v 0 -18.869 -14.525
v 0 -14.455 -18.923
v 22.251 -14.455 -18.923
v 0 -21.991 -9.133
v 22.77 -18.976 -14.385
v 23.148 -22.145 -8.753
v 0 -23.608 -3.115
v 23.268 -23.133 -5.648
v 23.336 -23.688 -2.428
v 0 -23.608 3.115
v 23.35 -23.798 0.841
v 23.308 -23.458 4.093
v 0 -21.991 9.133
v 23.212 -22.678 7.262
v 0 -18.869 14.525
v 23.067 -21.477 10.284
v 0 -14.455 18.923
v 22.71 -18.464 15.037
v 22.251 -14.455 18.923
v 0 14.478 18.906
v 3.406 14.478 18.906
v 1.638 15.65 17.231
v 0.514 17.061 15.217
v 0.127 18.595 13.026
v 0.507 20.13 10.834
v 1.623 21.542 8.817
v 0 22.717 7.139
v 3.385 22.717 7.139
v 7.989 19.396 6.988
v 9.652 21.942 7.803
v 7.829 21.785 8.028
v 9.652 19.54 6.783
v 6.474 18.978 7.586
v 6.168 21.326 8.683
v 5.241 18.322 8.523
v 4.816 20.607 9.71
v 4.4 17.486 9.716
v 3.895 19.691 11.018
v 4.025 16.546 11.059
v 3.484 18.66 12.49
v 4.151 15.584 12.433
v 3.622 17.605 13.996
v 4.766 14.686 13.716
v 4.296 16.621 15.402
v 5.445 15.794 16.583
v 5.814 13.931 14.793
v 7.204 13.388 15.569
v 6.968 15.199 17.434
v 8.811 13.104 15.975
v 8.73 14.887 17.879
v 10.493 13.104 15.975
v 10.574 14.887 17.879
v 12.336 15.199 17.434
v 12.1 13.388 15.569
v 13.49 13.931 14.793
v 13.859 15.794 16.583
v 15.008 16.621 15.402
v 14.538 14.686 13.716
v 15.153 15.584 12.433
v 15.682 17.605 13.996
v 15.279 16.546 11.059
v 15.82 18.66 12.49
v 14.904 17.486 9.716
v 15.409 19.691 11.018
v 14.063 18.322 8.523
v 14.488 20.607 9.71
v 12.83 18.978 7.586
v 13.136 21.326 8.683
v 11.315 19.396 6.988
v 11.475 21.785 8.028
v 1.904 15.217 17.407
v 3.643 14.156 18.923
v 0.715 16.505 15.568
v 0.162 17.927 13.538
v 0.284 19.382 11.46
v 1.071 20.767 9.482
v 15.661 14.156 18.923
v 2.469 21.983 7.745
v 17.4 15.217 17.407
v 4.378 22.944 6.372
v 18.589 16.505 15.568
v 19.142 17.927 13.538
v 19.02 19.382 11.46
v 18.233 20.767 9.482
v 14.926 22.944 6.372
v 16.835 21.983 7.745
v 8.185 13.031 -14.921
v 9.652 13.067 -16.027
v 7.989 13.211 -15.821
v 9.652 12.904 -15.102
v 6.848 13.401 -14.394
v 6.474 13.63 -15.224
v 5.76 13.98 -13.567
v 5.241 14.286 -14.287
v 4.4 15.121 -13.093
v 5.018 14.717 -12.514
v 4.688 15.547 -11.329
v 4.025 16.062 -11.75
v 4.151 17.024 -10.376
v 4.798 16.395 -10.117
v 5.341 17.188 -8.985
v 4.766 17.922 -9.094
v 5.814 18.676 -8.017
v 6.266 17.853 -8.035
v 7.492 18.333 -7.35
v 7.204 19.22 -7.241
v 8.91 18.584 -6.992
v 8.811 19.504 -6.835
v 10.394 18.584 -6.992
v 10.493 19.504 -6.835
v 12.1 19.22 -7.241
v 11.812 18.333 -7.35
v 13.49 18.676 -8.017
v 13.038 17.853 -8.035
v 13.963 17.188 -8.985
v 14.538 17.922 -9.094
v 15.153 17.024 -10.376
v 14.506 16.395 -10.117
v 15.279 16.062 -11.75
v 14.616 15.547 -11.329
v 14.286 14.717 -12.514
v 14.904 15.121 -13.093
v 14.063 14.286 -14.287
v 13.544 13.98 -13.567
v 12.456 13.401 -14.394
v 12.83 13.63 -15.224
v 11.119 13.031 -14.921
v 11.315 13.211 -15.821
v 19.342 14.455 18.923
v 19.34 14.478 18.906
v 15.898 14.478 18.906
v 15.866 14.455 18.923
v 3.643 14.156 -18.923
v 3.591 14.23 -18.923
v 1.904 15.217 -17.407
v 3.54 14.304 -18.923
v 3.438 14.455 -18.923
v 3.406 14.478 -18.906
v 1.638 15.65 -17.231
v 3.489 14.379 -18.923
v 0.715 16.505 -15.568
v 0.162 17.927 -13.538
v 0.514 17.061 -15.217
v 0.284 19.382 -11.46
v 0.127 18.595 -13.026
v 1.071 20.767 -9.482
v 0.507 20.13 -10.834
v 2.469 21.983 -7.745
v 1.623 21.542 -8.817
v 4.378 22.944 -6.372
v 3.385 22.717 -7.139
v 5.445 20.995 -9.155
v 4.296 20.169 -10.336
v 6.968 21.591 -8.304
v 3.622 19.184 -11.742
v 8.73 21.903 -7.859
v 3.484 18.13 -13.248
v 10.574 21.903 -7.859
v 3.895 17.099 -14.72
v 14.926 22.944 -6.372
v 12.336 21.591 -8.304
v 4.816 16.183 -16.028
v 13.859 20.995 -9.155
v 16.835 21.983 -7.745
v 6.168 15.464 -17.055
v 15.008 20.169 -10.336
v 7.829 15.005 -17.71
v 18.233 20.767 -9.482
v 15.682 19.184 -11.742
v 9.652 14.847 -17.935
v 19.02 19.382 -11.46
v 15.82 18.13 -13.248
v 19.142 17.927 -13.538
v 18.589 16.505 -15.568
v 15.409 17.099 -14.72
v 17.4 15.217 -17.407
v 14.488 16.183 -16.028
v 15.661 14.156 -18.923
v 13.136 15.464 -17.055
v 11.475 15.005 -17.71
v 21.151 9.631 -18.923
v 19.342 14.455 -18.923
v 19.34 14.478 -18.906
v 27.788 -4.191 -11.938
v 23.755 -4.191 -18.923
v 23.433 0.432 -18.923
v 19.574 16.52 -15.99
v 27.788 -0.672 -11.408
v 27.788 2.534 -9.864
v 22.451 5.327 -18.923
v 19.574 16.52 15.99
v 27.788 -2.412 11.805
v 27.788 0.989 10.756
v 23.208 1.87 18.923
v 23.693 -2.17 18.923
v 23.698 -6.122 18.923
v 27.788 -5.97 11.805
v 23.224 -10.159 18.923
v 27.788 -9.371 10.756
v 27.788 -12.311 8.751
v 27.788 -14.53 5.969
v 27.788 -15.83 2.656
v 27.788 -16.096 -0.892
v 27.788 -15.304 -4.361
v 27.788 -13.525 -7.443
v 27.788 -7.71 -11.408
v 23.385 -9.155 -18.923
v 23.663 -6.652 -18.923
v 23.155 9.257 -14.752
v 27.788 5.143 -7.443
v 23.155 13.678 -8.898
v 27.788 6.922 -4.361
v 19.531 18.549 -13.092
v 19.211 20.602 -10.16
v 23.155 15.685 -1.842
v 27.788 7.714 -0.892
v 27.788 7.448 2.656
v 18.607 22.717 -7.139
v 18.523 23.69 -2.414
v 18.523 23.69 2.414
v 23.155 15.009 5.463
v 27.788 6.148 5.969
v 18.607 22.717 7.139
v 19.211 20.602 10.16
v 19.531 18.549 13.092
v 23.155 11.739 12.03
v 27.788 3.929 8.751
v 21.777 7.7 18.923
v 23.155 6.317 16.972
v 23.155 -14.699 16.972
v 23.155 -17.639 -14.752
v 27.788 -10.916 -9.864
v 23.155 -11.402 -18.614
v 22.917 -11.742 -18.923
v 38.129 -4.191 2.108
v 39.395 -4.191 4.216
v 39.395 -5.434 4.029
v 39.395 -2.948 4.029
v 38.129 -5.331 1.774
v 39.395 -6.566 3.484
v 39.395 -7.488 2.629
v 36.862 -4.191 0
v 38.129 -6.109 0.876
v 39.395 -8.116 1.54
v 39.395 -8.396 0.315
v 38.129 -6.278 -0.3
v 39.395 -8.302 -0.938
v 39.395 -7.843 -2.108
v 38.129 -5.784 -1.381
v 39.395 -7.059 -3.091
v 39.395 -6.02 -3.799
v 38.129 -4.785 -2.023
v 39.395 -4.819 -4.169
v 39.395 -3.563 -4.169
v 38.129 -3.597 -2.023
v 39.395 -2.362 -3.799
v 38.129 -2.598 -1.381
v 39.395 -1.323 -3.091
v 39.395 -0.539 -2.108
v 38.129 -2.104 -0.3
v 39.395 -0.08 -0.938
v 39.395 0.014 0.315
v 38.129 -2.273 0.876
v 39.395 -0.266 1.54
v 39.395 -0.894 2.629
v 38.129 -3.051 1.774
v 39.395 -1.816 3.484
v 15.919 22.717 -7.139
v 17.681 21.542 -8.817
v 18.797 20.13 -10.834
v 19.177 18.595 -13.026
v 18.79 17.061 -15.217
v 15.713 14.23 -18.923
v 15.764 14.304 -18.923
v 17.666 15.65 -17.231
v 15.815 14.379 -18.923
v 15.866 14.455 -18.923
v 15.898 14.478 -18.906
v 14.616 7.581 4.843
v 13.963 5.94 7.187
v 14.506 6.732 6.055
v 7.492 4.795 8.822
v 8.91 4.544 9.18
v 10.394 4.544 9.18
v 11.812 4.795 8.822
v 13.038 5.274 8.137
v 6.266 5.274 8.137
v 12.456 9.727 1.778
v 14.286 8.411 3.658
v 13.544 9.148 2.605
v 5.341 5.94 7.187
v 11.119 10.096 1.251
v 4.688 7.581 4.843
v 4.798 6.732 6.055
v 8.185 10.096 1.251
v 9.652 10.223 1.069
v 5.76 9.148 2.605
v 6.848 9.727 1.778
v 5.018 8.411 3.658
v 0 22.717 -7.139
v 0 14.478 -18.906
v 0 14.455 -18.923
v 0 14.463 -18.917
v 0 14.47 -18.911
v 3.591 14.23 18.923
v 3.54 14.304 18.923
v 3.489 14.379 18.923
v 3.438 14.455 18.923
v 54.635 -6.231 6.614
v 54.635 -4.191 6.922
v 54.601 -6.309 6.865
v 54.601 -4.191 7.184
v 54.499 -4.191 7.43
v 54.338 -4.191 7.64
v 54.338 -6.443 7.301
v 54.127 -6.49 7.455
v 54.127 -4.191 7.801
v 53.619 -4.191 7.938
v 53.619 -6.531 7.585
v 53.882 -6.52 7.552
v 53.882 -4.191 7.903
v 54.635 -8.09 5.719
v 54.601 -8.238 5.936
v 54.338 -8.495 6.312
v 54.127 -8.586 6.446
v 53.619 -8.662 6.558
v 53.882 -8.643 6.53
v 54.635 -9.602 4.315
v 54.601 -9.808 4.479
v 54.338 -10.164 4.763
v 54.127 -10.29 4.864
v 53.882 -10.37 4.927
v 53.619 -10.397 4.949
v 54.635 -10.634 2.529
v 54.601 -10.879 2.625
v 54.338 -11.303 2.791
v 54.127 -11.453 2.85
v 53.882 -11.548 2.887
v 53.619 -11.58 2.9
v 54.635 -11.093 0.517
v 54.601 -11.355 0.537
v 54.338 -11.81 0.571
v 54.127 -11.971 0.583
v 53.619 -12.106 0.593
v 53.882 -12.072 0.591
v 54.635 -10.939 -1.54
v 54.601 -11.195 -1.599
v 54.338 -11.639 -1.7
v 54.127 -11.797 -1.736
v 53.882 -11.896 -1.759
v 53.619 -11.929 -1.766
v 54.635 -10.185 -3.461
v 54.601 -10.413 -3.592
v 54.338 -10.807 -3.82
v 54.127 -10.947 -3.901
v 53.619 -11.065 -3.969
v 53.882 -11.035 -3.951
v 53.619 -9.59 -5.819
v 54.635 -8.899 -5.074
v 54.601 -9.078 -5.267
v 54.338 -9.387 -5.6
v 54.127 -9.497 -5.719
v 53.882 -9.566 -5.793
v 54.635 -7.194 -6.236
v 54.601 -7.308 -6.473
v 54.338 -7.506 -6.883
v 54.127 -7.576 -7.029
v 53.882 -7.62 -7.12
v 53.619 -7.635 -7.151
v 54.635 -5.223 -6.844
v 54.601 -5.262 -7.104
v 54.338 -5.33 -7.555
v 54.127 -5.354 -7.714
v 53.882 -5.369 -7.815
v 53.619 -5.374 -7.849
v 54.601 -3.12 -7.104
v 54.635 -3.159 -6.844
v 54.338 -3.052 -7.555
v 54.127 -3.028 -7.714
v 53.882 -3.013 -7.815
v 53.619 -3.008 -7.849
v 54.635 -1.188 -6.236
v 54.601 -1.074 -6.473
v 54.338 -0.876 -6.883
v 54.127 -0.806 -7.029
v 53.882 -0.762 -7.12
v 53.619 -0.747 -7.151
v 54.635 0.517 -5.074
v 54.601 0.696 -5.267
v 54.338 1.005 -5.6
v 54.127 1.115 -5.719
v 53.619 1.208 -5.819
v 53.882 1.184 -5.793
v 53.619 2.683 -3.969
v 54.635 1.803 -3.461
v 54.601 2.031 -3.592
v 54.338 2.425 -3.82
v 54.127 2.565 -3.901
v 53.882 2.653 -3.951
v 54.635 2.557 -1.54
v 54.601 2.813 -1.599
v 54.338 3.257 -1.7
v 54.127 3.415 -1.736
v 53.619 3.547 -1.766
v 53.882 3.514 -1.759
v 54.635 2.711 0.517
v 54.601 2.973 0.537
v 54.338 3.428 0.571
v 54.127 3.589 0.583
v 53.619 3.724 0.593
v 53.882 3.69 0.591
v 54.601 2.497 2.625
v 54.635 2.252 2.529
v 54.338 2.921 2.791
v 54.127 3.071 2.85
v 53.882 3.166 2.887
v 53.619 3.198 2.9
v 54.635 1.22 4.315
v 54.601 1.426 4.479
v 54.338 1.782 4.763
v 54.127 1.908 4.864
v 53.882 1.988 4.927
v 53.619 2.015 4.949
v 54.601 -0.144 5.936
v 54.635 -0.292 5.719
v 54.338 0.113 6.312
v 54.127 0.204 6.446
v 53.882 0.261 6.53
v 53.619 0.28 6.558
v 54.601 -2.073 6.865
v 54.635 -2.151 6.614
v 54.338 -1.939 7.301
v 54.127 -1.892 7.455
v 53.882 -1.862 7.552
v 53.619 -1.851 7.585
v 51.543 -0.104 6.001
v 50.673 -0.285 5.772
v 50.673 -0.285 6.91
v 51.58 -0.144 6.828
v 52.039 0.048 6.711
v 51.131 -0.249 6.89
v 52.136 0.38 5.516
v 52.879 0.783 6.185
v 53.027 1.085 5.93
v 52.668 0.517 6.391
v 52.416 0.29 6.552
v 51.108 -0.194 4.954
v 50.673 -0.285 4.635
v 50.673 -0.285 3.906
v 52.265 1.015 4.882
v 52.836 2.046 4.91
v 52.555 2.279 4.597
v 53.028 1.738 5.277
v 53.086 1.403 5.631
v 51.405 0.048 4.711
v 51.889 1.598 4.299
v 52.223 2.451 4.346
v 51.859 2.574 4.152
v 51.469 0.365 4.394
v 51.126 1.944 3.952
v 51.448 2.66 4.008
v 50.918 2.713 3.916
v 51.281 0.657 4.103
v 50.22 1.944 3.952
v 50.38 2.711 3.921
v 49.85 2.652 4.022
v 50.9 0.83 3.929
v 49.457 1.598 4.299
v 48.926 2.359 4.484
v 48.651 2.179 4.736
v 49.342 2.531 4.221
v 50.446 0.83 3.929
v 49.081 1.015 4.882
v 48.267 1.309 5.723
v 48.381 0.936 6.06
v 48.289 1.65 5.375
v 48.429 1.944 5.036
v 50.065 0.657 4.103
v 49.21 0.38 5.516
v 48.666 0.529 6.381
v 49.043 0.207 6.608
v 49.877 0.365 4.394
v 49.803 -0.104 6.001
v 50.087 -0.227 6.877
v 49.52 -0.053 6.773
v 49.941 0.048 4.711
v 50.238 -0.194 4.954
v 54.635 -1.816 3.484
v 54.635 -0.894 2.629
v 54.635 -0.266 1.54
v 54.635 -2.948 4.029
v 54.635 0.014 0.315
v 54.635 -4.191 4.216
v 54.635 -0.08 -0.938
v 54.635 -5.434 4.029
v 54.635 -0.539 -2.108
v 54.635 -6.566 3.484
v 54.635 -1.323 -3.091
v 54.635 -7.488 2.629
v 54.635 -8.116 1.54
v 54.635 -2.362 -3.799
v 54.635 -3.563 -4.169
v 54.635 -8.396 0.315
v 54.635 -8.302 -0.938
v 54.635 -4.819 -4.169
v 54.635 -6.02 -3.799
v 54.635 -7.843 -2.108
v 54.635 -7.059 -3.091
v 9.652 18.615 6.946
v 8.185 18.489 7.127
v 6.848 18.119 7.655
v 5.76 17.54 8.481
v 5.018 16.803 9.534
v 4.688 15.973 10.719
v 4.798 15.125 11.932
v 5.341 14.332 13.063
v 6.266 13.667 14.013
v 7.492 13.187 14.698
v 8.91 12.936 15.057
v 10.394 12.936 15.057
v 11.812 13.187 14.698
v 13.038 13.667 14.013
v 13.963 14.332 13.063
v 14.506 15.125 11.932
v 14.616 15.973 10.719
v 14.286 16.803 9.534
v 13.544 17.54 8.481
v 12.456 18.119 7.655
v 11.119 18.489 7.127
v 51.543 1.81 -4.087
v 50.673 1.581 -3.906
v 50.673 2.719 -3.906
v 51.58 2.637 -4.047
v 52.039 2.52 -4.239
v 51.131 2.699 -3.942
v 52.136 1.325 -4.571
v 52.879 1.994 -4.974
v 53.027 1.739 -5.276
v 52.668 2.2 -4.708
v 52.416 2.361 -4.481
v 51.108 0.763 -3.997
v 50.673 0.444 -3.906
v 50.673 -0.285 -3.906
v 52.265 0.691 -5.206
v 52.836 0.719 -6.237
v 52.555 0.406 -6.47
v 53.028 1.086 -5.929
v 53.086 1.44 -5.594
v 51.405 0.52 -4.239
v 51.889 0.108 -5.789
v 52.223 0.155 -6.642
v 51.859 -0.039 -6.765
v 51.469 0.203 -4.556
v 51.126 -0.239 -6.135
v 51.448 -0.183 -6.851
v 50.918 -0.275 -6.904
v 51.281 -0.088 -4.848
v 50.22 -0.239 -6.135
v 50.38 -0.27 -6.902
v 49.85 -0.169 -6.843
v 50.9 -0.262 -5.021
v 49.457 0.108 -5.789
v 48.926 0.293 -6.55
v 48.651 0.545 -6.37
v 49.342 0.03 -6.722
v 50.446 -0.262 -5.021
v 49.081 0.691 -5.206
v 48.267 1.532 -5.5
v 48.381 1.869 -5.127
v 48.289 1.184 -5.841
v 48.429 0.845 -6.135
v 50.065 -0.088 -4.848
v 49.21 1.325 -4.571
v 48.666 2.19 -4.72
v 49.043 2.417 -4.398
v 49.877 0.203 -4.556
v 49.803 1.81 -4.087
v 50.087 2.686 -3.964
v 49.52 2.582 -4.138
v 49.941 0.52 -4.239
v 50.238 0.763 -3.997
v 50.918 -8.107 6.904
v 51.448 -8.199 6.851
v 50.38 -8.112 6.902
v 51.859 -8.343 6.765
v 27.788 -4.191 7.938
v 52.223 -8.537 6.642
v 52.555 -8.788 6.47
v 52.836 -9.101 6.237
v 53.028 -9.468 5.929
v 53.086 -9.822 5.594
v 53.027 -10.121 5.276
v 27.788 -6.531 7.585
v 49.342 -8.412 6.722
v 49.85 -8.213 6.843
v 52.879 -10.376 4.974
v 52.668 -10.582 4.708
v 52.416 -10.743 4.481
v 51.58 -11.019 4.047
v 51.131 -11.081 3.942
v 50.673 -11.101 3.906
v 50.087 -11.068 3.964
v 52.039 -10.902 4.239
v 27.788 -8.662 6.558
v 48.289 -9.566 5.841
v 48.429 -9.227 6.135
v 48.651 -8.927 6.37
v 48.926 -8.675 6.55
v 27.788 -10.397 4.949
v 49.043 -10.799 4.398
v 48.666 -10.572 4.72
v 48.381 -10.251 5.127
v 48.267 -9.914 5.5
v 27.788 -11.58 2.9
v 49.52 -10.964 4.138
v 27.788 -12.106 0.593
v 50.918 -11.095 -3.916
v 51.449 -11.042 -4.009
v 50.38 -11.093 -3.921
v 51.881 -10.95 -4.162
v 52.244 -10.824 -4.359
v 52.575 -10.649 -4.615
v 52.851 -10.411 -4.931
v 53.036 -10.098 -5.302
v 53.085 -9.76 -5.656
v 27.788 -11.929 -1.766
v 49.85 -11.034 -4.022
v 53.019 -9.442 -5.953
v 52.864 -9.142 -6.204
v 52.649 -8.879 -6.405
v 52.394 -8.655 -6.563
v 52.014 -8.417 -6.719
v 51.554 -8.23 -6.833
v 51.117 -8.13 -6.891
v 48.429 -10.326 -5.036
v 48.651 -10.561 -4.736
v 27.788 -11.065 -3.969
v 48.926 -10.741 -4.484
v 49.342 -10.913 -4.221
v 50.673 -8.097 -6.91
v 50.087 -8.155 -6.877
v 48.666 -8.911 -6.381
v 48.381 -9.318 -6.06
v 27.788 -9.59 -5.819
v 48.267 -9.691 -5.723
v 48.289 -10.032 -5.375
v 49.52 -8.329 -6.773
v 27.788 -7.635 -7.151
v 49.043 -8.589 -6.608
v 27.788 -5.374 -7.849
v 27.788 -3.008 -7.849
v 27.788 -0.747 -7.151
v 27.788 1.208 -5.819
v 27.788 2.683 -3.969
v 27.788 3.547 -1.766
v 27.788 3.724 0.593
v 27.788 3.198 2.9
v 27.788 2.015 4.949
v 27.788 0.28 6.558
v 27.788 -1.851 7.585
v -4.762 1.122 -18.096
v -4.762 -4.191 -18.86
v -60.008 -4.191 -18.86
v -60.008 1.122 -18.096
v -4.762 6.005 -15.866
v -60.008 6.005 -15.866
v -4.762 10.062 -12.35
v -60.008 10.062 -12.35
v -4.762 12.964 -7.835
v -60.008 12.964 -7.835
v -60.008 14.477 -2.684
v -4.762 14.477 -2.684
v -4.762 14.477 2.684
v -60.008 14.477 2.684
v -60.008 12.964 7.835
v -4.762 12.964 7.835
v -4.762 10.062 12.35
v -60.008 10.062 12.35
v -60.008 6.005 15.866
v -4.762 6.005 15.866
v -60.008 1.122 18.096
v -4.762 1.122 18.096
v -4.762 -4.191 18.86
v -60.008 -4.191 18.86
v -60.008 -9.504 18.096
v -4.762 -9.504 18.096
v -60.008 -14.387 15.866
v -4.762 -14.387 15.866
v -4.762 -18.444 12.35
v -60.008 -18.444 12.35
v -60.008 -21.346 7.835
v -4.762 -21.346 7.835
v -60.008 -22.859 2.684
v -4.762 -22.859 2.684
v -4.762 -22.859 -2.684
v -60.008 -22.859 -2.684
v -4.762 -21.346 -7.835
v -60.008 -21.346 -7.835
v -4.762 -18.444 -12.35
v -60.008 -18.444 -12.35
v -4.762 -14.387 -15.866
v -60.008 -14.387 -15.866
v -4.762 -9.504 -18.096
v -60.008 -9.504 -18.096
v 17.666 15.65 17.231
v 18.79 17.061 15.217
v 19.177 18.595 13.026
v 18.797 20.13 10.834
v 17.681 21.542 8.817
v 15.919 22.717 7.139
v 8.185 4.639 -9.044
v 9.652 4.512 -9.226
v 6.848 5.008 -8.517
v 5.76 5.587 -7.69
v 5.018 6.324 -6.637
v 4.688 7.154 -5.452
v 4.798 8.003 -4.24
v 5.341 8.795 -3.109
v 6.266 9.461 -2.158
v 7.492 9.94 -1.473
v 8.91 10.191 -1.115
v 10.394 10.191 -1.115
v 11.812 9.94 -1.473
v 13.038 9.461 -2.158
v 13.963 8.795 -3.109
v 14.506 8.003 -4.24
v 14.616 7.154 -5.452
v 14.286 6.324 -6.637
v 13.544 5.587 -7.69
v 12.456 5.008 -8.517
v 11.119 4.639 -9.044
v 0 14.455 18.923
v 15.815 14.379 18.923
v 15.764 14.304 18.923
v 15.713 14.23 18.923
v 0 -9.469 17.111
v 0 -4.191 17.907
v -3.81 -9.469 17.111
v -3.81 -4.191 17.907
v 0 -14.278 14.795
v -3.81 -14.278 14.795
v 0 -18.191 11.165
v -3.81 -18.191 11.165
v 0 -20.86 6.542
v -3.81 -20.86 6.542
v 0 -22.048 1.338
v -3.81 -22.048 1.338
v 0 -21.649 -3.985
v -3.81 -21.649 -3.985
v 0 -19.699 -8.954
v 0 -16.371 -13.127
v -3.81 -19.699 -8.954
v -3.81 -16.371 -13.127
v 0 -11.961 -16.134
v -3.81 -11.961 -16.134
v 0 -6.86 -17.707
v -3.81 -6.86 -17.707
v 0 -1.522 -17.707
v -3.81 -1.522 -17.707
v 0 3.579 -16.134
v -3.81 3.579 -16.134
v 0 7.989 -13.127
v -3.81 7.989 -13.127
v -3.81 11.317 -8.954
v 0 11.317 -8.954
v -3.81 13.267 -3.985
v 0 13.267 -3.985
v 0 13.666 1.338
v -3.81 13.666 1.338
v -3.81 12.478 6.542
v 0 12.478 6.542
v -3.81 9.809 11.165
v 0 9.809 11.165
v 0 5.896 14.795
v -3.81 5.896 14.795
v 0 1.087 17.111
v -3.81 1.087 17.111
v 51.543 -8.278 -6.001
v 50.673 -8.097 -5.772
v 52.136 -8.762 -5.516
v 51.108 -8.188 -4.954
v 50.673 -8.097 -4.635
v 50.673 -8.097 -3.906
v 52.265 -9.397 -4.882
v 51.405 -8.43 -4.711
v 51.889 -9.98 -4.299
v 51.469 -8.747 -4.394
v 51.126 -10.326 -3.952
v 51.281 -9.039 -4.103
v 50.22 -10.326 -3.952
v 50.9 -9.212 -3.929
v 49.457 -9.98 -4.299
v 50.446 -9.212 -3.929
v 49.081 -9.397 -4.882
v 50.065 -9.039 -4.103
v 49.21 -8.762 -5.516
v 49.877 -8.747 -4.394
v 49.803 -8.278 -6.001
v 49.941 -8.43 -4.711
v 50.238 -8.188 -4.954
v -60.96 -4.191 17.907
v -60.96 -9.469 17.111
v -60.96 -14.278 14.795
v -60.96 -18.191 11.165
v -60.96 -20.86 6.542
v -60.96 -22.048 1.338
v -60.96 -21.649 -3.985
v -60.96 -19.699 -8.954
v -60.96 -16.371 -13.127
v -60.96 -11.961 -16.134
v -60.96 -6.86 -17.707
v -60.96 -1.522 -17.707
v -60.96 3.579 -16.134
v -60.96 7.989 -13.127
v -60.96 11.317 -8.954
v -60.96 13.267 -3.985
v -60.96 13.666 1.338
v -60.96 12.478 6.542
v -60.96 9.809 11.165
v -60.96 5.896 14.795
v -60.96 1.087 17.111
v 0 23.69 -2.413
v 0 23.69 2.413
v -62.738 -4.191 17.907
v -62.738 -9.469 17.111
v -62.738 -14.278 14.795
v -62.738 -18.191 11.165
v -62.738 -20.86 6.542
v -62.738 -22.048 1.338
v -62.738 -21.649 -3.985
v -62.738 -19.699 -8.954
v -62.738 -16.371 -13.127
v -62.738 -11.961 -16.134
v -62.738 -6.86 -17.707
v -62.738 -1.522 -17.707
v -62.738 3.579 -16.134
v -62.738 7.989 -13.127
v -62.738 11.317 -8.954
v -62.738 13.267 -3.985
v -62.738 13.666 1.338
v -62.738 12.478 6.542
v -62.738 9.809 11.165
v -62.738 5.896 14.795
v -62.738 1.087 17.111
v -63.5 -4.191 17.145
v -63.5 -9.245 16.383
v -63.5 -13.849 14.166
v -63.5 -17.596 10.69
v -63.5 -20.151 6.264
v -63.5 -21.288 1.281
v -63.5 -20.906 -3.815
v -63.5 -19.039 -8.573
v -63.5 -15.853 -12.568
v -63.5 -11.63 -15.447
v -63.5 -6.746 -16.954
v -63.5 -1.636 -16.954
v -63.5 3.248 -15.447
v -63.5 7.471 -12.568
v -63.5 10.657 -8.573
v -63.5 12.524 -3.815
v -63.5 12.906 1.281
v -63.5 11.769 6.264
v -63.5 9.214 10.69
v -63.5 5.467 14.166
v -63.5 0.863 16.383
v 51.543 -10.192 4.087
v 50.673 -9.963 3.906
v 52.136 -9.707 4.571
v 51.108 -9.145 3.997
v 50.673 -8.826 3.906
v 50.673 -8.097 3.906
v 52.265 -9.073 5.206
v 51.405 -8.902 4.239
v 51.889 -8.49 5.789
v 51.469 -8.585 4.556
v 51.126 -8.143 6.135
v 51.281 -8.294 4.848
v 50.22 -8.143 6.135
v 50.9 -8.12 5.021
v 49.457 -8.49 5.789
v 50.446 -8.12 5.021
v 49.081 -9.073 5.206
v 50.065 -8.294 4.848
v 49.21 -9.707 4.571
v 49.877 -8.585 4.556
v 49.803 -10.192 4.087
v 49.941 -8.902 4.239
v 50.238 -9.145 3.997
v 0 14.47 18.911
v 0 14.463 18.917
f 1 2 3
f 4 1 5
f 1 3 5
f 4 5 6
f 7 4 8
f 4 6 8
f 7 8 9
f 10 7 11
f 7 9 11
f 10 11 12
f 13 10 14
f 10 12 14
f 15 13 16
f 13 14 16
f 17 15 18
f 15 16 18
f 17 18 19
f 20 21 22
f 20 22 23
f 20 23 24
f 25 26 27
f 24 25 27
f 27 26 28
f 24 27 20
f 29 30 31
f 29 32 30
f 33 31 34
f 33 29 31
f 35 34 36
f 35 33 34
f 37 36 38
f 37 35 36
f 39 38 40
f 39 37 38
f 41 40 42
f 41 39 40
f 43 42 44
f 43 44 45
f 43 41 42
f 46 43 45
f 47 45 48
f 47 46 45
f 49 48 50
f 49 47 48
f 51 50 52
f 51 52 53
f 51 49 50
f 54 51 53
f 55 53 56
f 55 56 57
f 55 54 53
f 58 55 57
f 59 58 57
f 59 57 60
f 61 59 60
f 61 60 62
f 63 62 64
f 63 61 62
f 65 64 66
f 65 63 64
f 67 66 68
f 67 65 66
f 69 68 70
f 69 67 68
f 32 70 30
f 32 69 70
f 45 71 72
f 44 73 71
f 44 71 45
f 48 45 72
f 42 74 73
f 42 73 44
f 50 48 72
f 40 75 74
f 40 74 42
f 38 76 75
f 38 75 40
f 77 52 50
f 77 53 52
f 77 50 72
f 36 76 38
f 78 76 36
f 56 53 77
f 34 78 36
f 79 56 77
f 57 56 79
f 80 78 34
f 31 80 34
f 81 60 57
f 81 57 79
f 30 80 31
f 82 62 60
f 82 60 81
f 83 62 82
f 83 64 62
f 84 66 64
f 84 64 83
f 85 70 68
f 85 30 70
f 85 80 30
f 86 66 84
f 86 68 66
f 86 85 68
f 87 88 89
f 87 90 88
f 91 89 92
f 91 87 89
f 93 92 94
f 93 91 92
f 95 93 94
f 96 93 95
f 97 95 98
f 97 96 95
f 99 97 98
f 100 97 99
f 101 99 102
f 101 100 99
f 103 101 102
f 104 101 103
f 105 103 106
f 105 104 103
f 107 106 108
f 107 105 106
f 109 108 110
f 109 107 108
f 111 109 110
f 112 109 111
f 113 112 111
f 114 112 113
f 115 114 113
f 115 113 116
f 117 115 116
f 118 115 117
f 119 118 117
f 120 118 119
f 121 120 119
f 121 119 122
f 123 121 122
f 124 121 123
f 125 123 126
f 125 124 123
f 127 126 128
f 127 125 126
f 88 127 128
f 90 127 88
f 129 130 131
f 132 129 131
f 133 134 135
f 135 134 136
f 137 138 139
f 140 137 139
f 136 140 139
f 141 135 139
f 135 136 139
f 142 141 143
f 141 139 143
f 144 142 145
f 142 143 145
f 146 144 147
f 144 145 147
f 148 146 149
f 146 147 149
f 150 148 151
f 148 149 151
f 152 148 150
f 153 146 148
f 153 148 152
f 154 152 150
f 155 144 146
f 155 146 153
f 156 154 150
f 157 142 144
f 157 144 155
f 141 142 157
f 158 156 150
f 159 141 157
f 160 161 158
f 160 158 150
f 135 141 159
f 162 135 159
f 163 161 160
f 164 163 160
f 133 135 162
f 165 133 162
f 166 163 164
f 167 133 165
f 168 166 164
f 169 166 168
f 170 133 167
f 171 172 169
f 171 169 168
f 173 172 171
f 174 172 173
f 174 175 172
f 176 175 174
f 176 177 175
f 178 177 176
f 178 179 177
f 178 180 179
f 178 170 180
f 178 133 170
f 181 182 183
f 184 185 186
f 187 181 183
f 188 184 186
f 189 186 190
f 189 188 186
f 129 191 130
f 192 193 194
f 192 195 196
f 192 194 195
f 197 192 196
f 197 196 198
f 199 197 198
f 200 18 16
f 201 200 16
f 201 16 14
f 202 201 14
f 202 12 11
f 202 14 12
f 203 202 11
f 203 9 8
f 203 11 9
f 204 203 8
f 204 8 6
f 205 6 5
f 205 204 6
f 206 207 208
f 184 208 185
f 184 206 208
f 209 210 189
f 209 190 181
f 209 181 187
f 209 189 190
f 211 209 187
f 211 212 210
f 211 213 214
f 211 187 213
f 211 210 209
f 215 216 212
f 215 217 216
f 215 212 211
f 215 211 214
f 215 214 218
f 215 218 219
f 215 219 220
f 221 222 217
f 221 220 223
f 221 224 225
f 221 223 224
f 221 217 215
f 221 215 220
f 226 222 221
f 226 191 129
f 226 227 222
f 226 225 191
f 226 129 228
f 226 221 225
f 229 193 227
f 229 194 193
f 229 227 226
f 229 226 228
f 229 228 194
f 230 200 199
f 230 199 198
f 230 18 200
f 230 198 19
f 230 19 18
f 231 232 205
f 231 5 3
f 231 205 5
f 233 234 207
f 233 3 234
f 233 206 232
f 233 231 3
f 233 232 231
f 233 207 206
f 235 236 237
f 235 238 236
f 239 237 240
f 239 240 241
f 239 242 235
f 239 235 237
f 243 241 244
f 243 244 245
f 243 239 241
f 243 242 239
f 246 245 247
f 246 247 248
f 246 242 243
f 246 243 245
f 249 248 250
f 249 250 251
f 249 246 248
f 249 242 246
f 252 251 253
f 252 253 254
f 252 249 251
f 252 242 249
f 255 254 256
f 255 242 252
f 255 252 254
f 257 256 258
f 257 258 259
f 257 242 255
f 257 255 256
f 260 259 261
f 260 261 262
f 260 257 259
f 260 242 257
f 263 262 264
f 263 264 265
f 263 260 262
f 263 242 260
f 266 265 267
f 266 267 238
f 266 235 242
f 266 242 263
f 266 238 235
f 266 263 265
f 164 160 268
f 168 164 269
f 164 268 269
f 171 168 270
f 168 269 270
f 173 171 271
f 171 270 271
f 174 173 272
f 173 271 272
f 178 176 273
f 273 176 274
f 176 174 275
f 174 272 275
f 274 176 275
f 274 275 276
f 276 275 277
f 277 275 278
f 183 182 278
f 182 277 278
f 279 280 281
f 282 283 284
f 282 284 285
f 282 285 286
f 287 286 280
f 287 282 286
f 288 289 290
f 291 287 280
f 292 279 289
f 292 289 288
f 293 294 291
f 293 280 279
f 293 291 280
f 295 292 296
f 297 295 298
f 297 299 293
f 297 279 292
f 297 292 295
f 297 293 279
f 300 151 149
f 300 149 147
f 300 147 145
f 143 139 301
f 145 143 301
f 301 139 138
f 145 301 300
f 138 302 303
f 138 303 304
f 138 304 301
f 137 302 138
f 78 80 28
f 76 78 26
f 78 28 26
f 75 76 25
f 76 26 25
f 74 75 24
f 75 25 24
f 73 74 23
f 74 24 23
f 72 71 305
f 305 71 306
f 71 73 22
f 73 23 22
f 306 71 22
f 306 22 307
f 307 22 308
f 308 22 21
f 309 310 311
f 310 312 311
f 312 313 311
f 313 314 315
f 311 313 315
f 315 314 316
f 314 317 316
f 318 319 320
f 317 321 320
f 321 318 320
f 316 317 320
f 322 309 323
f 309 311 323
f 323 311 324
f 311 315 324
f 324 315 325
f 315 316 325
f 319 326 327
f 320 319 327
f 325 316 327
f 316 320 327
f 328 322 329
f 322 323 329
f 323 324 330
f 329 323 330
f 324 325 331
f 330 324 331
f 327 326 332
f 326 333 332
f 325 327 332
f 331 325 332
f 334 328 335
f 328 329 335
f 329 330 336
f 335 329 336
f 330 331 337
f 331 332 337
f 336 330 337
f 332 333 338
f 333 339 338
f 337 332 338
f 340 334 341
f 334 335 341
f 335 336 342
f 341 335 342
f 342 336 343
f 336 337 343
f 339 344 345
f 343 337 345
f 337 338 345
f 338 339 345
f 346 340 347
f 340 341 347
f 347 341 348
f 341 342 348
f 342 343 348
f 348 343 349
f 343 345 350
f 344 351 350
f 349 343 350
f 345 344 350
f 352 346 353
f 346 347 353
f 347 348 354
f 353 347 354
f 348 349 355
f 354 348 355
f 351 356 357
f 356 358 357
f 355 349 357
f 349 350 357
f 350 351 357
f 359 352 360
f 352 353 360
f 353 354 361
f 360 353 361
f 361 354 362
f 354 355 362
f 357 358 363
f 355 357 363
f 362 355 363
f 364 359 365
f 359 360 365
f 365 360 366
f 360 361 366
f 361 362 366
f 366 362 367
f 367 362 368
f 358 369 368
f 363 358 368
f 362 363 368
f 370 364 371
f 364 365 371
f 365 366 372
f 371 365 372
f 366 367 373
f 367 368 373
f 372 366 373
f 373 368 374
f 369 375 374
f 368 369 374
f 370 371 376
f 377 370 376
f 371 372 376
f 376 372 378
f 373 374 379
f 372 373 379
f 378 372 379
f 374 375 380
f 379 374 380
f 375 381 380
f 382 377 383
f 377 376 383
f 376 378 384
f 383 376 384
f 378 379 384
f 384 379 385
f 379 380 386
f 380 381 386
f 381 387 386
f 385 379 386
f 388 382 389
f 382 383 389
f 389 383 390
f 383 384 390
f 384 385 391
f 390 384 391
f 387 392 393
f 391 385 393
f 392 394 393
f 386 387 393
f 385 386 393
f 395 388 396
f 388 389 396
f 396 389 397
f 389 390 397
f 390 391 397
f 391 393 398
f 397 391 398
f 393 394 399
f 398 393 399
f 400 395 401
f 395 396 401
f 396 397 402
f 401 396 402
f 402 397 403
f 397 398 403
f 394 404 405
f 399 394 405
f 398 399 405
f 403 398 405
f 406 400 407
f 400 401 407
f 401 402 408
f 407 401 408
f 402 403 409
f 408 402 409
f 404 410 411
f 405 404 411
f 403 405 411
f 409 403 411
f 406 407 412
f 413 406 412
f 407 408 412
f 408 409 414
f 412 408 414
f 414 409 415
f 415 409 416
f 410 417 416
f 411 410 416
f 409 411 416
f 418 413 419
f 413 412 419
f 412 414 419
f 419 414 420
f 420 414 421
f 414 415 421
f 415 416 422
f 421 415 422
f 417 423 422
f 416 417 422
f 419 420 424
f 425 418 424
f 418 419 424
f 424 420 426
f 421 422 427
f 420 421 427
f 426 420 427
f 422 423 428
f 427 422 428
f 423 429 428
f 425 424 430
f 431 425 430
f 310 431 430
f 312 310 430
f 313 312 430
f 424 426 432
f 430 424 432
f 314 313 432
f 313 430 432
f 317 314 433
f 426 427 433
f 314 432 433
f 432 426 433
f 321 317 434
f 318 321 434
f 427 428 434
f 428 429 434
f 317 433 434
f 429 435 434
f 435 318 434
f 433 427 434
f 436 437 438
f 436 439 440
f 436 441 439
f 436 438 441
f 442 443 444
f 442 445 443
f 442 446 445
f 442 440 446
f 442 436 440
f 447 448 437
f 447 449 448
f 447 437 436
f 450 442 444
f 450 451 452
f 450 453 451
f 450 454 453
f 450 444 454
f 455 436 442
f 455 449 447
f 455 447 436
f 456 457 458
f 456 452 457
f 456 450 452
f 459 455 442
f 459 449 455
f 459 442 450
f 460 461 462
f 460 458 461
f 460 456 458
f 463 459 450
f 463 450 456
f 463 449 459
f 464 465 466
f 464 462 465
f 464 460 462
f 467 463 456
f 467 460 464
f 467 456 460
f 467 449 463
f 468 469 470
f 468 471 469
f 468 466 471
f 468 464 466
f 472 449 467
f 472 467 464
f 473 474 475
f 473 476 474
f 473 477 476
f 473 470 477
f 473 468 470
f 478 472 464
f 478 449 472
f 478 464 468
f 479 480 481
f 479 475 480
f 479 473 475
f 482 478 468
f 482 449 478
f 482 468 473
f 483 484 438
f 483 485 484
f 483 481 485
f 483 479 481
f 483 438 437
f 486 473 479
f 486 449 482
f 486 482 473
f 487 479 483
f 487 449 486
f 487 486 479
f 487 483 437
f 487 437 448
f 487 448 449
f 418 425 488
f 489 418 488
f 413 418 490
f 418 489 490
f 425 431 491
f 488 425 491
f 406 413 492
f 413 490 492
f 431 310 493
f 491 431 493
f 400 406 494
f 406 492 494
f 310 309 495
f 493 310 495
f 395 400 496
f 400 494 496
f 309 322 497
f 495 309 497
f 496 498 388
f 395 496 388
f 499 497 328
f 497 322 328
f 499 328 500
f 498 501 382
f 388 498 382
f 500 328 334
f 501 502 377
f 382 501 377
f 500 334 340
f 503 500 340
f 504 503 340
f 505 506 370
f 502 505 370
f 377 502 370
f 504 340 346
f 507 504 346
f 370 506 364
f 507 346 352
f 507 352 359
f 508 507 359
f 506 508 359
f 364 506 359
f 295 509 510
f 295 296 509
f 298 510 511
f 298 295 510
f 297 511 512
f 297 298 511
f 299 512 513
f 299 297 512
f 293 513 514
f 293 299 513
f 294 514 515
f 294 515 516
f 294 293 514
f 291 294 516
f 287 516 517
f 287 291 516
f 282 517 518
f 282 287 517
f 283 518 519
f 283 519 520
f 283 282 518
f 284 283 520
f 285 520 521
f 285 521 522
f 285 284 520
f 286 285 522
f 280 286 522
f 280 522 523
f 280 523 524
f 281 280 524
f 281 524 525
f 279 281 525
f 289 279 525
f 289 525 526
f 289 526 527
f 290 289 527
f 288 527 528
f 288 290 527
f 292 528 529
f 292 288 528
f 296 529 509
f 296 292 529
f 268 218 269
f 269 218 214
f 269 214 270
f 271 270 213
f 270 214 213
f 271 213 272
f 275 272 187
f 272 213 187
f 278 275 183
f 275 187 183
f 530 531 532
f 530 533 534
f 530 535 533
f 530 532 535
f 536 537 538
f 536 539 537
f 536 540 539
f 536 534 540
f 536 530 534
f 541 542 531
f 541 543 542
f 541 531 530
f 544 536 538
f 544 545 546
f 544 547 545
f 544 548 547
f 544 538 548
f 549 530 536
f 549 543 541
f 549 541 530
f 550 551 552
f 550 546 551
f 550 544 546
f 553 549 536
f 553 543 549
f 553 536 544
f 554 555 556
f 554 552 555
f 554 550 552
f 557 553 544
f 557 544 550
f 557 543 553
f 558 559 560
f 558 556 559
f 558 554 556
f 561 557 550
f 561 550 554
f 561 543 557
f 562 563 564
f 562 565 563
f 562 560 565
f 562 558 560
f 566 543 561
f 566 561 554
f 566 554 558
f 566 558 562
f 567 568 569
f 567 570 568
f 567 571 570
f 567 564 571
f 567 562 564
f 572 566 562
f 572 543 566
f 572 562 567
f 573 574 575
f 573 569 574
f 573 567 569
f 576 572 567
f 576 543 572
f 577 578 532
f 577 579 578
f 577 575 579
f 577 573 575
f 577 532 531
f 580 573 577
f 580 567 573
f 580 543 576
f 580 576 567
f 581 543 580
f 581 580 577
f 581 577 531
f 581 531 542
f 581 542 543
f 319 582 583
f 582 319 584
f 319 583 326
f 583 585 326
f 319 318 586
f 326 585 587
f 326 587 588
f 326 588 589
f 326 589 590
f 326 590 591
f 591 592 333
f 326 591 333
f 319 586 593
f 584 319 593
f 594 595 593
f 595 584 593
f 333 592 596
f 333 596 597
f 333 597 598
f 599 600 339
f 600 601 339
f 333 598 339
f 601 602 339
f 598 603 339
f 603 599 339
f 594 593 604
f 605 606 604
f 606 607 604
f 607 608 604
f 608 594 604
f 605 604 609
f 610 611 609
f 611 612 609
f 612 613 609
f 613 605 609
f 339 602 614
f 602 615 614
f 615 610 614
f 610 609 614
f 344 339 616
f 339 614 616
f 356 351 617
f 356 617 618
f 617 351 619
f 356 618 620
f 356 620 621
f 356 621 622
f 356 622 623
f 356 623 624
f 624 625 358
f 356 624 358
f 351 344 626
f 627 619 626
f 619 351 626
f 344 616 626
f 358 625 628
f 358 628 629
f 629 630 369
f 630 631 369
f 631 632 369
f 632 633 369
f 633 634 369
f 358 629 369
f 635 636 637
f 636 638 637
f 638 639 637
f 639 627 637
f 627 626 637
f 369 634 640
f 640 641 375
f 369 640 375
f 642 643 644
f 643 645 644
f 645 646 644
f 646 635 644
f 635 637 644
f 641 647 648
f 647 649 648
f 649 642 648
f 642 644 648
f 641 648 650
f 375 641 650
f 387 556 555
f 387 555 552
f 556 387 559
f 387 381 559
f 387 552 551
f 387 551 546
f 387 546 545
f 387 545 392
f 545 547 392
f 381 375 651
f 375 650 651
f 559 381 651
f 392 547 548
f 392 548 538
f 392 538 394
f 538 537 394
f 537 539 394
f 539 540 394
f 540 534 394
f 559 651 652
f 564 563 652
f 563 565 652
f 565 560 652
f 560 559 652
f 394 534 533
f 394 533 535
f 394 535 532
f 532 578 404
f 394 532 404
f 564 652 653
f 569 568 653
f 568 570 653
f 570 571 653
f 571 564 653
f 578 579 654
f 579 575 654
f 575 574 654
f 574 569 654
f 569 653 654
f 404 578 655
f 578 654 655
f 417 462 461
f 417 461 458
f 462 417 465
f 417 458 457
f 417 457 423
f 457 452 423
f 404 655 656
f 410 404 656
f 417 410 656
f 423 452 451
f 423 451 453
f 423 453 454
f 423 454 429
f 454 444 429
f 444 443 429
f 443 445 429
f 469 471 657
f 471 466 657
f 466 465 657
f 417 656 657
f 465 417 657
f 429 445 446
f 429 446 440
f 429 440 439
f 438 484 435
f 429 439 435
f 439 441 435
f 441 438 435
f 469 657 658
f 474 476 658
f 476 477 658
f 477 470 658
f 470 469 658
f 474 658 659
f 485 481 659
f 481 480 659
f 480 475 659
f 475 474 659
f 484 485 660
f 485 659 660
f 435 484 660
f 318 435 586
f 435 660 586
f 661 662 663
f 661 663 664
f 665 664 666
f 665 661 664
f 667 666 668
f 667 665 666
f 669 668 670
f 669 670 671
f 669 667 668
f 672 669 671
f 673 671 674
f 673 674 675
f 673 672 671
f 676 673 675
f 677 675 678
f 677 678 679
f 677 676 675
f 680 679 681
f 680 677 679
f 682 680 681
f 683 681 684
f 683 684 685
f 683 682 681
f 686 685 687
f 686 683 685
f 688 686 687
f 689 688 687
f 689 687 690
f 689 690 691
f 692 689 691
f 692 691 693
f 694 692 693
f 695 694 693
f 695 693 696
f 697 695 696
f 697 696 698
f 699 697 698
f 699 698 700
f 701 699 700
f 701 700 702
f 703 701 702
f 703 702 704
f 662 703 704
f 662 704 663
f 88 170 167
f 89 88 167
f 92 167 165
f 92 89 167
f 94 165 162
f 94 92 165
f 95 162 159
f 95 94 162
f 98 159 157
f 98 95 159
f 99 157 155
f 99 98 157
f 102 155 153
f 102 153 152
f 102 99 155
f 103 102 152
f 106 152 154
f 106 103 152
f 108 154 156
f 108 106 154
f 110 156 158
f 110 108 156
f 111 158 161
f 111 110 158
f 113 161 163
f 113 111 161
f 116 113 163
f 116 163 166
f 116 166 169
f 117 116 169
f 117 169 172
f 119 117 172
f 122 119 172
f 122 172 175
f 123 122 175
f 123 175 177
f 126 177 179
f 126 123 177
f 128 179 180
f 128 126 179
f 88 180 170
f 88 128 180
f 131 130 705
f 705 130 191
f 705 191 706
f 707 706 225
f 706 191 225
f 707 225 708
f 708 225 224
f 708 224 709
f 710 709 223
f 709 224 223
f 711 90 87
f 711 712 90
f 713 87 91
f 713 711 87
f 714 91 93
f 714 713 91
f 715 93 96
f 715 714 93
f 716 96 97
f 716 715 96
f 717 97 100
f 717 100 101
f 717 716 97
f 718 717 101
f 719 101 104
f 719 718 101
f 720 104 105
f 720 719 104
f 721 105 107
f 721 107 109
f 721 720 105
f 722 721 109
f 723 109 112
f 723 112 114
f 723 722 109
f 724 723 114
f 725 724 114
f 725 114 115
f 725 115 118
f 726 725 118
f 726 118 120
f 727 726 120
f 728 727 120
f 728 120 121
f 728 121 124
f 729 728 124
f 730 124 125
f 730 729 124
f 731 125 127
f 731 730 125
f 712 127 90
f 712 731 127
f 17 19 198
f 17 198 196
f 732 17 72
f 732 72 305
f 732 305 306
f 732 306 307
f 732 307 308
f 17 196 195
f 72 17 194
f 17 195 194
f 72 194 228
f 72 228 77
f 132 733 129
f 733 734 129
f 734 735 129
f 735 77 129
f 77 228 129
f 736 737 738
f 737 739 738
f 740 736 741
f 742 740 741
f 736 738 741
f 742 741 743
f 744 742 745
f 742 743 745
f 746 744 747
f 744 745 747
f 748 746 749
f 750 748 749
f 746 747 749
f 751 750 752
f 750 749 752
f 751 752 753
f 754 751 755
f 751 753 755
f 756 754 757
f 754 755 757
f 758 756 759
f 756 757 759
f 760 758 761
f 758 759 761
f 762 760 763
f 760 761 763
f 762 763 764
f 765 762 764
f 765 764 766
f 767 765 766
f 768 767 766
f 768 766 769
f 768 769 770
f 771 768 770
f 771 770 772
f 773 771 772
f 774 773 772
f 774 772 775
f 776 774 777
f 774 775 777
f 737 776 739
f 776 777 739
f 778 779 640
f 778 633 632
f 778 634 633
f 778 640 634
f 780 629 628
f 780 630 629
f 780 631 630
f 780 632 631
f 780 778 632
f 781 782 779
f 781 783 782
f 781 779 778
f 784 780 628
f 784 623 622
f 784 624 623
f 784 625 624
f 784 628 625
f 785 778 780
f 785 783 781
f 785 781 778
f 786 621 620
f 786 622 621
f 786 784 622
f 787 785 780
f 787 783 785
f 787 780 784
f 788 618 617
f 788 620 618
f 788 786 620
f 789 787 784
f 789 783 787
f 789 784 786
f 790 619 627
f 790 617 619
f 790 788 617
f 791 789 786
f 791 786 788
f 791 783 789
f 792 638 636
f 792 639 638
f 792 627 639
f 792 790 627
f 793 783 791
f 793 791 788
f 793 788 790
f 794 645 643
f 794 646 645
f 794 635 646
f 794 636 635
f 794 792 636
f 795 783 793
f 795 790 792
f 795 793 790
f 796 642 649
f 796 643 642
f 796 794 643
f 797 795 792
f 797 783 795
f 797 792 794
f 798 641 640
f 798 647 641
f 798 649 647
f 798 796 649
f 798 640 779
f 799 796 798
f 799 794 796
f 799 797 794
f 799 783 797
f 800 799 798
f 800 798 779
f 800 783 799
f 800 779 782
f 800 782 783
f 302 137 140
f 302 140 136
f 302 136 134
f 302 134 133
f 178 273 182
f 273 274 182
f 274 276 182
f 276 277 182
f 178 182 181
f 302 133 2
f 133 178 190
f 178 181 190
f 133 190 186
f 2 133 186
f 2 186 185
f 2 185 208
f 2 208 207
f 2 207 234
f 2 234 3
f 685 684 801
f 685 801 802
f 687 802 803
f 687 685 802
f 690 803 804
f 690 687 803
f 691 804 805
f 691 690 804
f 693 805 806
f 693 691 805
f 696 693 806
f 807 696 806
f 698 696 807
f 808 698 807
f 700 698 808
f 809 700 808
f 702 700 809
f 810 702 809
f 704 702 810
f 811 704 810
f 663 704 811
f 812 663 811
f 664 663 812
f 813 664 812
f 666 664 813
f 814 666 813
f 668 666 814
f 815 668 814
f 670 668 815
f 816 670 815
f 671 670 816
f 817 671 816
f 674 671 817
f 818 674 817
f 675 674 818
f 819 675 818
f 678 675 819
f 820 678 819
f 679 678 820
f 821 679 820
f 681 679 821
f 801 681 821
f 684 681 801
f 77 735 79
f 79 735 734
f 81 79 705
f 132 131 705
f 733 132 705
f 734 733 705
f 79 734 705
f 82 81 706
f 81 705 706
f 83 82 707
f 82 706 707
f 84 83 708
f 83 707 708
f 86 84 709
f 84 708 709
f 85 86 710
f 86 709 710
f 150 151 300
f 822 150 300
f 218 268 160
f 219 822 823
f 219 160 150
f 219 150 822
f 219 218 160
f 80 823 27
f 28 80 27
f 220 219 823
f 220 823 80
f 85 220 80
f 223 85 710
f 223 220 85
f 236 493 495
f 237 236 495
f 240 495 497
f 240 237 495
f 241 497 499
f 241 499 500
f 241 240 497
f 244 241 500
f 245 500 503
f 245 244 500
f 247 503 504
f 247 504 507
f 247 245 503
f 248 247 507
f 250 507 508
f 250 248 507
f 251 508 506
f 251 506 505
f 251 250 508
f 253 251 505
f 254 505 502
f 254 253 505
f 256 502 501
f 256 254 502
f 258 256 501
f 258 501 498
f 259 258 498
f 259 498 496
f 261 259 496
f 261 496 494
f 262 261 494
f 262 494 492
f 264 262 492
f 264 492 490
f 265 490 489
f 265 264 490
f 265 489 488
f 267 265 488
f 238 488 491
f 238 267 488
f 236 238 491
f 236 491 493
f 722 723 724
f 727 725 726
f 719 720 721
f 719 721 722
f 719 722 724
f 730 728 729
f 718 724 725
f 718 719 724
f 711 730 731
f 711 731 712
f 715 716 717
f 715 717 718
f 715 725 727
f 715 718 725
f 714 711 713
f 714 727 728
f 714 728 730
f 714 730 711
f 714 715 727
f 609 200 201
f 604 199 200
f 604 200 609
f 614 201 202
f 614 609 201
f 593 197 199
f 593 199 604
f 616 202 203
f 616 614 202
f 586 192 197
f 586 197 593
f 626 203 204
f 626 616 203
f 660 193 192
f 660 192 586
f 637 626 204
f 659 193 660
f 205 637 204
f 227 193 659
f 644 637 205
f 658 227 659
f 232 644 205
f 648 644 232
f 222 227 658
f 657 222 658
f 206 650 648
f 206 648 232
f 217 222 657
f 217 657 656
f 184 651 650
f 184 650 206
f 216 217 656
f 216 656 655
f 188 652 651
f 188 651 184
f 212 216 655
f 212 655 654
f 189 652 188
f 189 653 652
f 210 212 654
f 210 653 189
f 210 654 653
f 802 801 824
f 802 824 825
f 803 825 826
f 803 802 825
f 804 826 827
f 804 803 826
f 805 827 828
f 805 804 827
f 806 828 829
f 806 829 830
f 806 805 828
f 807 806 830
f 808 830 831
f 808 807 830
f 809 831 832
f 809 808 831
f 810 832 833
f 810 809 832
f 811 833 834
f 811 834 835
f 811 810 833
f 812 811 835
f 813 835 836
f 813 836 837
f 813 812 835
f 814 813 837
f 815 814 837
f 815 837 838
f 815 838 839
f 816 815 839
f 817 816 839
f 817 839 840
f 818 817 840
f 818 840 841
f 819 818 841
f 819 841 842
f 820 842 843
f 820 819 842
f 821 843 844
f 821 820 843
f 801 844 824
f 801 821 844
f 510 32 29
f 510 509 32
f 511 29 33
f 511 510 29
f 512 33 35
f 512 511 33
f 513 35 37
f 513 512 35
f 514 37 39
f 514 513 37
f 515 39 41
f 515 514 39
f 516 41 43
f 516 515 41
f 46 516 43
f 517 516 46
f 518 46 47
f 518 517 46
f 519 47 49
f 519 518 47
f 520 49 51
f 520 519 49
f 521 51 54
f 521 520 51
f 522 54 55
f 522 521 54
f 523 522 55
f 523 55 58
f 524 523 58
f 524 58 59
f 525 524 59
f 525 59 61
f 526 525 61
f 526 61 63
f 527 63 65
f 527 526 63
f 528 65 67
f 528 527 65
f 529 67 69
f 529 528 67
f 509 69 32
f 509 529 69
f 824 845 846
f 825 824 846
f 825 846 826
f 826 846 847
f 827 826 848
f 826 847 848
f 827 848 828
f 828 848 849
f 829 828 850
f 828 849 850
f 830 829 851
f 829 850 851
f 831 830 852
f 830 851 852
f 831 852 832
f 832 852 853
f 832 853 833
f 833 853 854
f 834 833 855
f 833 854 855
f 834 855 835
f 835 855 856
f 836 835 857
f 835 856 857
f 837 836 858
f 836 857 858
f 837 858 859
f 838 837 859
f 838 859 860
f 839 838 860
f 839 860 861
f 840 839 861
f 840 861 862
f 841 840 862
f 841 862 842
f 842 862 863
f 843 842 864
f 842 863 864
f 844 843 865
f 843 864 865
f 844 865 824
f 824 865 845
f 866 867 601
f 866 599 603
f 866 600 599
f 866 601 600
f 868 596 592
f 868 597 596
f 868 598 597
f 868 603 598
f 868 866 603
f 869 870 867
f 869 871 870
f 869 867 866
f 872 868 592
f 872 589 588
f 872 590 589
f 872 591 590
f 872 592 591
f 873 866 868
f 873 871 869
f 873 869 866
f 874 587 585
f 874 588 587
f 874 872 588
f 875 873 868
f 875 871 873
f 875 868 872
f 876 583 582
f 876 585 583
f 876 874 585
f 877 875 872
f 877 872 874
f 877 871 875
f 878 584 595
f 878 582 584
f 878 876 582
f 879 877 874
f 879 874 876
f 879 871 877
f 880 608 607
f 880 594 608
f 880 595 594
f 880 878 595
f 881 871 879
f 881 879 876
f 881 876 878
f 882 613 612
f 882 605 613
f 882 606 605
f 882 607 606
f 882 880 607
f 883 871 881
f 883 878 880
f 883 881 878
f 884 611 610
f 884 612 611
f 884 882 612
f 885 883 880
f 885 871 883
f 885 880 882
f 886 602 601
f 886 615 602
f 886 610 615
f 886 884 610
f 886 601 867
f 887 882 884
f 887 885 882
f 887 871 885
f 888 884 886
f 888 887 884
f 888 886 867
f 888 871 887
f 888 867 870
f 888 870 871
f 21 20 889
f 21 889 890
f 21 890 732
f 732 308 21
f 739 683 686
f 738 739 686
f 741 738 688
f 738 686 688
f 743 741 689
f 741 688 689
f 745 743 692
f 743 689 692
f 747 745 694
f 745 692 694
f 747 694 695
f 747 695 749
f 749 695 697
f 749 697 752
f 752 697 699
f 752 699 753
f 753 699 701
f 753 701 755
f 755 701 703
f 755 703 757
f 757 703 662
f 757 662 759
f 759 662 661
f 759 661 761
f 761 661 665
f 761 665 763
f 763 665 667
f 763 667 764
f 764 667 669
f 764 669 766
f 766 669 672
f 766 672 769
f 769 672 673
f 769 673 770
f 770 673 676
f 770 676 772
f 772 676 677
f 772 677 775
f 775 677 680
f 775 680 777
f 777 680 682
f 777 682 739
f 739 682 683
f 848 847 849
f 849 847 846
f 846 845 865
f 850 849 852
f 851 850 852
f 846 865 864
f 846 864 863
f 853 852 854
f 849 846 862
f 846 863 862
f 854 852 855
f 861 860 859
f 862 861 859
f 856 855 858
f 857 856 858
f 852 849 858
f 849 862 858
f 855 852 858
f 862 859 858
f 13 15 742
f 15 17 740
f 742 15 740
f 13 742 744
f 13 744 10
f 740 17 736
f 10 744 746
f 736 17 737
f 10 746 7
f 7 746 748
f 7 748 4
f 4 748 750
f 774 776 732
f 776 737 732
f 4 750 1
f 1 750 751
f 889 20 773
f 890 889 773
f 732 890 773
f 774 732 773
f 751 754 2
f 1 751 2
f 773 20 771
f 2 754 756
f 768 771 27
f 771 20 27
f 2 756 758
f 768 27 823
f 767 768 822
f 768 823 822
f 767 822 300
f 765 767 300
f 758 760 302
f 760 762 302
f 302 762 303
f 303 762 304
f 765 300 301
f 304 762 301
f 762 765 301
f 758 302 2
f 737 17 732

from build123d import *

# Parameters (mm, degrees)
SKETCH1_R           = 23.8125
EXTRUDE1_DEPTH      = 27.7876
EXTRUDE1_DEPTH_BACK = 63.5
CUT_EXTRUDE1_REACH  = 65.5
SKETCH2_R           = 23.8125
SKETCH2_R_2         = 18.8595
CUT_EXTRUDE3_START  = -27.7876
SKETCH4_R           = 28.575
CUT_EXTRUDE3_DEPTH  = 27.7876
SKETCH18_R          = 9.525
CUT_EXTRUDE4_DEPTH  = 0.254
SKETCH19_R          = 9.525
CUT_EXTRUDE5_DEPTH  = 0.254
CHAMFER1_SIZE       = 0.762
CIRPATTERN1_COUNT   = 4


with BuildPart() as part:
    # Sketch1 → Extrude1 (new body, two sides)
    with BuildSketch(Plane(origin=(0, 0, 0), x_dir=(0, 0, -1), z_dir=(1, 0, 0))) as extrude1_sk:
        Circle(SKETCH1_R)
    extrude(amount=EXTRUDE1_DEPTH)
    extrude(extrude1_sk.sketch, amount=-EXTRUDE1_DEPTH_BACK)

    # Sketch2 → Cut-Extrude1 (cut, up to next)
    with BuildSketch(Plane(origin=(0, 0, 0), x_dir=(0, 0, -1), z_dir=(1, 0, 0)), mode=Mode.PRIVATE) as cut_extrude1_sk1:
        Circle(SKETCH2_R)
        with Locations((0, -4.191)):
            Circle(SKETCH2_R_2, mode=Mode.SUBTRACT)
    cut_extrude1_tool1 = extrude(cut_extrude1_sk1.sketch, amount=-CUT_EXTRUDE1_REACH, mode=Mode.PRIVATE) & part.part
    add(cut_extrude1_tool1.solids().sort_by_distance((0, 0, 23.138981))[0], mode=Mode.SUBTRACT)

    # Sketch4 → Cut-Extrude3 (cut)
    with BuildSketch(Plane.ZY.offset(CUT_EXTRUDE3_START)):
        Circle(SKETCH4_R)
        with BuildLine():
            Line((18.923, -14.455283714), (18.923, 14.465869871))
            Line((18.923, 14.465869871), (0, 27.715897117))
            Line((0, 27.715897117), (-18.923, 14.465869871))
            Line((-18.923, 14.465869871), (-18.923, -14.455283714))
            ThreePointArc((-18.923, -14.455283714), (0, -23.8125), (18.923, -14.455283714))
        make_face(mode=Mode.SUBTRACT)
    extrude(amount=CUT_EXTRUDE3_DEPTH, mode=Mode.SUBTRACT)

    # Sketch6 → Cut-Revolve2 (revolve, cut)
    with BuildSketch(Plane.XY, mode=Mode.PRIVATE) as cut_revolve2_sk:
        Polygon((4.764025965, 47.625), (27.7876, 7.747), (27.7876, 47.625), align=None)
    revolve(cut_revolve2_sk.sketch.rotate(Axis((3.612847264, -4.191, 0), (1, 0, 0)), 270), axis=Axis((3.612847264, -4.191, 0), (1, 0, 0)), mode=Mode.SUBTRACT)  # turned: the seam where the file's is

    # S2D0002 → Cut-Revolve3 (revolve, cut)
    with BuildSketch(Plane(origin=(9.652, 18.394824642, 12.869035589), x_dir=(0, 0.573576436, -0.819152044), z_dir=(1, 0, 0))):
        Polygon((0, 0), (6.1849, 0), (5.642306865, -2.5527), (4.9784, -3.216606865), (4.9784, -13.462), (0, -13.462), align=None)
    revolve(axis=Axis((9.652, 6.816028581, 4.761475303), (0, 0.819152044, 0.573576436)), mode=Mode.SUBTRACT)

    # Sketch8 → Cut-Revolve4 (revolve, cut)
    with BuildSketch(Plane(origin=(9.652, 18.394824642, -12.869035589), x_dir=(0, -0.573576436, -0.819152044), z_dir=(1, 0, 0))):
        Polygon((0, 0), (6.1849, 0), (5.642306865, -2.5527), (4.9784, -3.216606865), (4.9784, -13.462), (0, -13.462), align=None)
    revolve(axis=Axis((9.652, 6.816028581, -4.761475303), (0, 0.819152044, -0.573576436)), mode=Mode.SUBTRACT)

    # Sketch18 → Cut-Extrude4 (cut)
    with BuildSketch(Plane(origin=(0, 18.59764611, 13.022211999), x_dir=(1, 0, 0), z_dir=(0, 0.819152044, 0.573576436))):
        with Locations((9.652, 0.009141155)):
            Circle(SKETCH18_R)
    extrude(amount=-CUT_EXTRUDE4_DEPTH, mode=Mode.SUBTRACT)

    # Sketch19 → Cut-Extrude5 (cut)
    with BuildSketch(Plane(origin=(0, 18.59764611, -13.022211999), x_dir=(1, 0, 0), z_dir=(0, 0.819152044, -0.573576436))):
        with Locations((9.652, -0.009141155)):
            Circle(SKETCH19_R)
    extrude(amount=-CUT_EXTRUDE5_DEPTH, mode=Mode.SUBTRACT)

    # Sketch10 → Cut-Revolve6 (revolve, cut)
    with BuildSketch(Plane.XY, mode=Mode.PRIVATE) as cut_revolve6_sk:
        Polygon((0, 14.6685), (0, 13.716), (-3.81, 13.716), (-4.7625, 14.6685), align=None)
    revolve(cut_revolve6_sk.sketch.rotate(Axis((-5.000625, -4.191, 0), (1, 0, 0)), 90), axis=Axis((-5.000625, -4.191, 0), (1, 0, 0)), mode=Mode.SUBTRACT)  # turned: the seam where the file's is

    # Sketch12 → Cut-Revolve8 (revolve, cut)
    with BuildSketch(Plane.XY, mode=Mode.PRIVATE) as cut_revolve8_sk:
        Polygon((-63.5, 14.6685), (-63.5, 13.716), (-60.96, 13.716), (-60.0075, 14.6685), align=None)
    revolve(cut_revolve8_sk.sketch.rotate(Axis((-63.674625, -4.191, 0), (1, 0, 0)), 90), axis=Axis((-63.674625, -4.191, 0), (1, 0, 0)), mode=Mode.SUBTRACT)  # turned: the seam where the file's is

    # Chamfer1
    chamfer1_edges = [part.edges().sort_by_distance(p)[0] for p in [
        (-63.5, -4.191, -17.907),
    ]]
    chamfer(chamfer1_edges, length=CHAMFER1_SIZE)

    # Sketch13 → Revolve1 (revolve)
    with BuildSketch(Plane(origin=(0, 0, 0), x_dir=(0, -1, 0), z_dir=(0, 0, 1)), mode=Mode.PRIVATE) as revolve1_sk:
        with BuildLine():
            Line((4.191, 27.7876), (4.191, 54.6354))
            Line((4.191, 54.6354), (11.1125, 54.6354))
            ThreePointArc((11.1125, 54.6354), (11.83092049, 54.33782049), (12.1285, 53.6194))
            Line((12.1285, 53.6194), (12.1285, 27.7876))
            Line((12.1285, 27.7876), (4.191, 27.7876))
        make_face()
    revolve(revolve1_sk.sketch.rotate(Axis((26.44521, -4.191, 0), (1, 0, 0)), 270), axis=Axis((26.44521, -4.191, 0), (1, 0, 0)))  # turned: the seam where the file's is

    # S2D0001 → Cut-Revolve9 (revolve, cut)
    with BuildSketch(Plane(origin=(54.6354, -8.4074, 0), x_dir=(0, -1, 0), z_dir=(0, 0, 1)), mode=Mode.PRIVATE) as cut_revolve9_sk:
        Polygon((0, 0), (0, -15.24), (-4.2164, -17.773468714), (-4.2164, 0), align=None)
    revolve(cut_revolve9_sk.sketch.rotate(Axis((35.97325785, -4.191, 0), (1, 0, 0)), 270), axis=Axis((35.97325785, -4.191, 0), (1, 0, 0)), mode=Mode.SUBTRACT)  # turned: the seam where the file's is

    # Sketch16 → Cut-Revolve10 (revolve, cut)
    with BuildSketch(Plane(origin=(50.673, 1.421660076, -5.612660076), x_dir=(-1, 0, 0), z_dir=(0, -0.707106781, -0.707106781)), mode=Mode.PRIVATE) as cut_revolve10_sk:
        Polygon((0, 0), (2.413, 0), (0, -2.413), align=None)
    cut_revolve10 = revolve(cut_revolve10_sk.sketch.rotate(Axis((50.673, -2.1640922, -2.0269078), (0, 0.707106781, -0.707106781)), 90), axis=Axis((50.673, -2.1640922, -2.0269078), (0, 0.707106781, -0.707106781)), mode=Mode.SUBTRACT)  # turned: the seam where the file's is

    # CirPattern1: Cut-Revolve10 ×4 about axis
    cirpattern1_axis = Axis((26.44521, -4.191, 0), (-1, 0, 0))
    for i in range(1, CIRPATTERN1_COUNT):
        add(cut_revolve10.rotate(cirpattern1_axis, i * 360 / CIRPATTERN1_COUNT), mode=Mode.SUBTRACT)


solid = part.part
